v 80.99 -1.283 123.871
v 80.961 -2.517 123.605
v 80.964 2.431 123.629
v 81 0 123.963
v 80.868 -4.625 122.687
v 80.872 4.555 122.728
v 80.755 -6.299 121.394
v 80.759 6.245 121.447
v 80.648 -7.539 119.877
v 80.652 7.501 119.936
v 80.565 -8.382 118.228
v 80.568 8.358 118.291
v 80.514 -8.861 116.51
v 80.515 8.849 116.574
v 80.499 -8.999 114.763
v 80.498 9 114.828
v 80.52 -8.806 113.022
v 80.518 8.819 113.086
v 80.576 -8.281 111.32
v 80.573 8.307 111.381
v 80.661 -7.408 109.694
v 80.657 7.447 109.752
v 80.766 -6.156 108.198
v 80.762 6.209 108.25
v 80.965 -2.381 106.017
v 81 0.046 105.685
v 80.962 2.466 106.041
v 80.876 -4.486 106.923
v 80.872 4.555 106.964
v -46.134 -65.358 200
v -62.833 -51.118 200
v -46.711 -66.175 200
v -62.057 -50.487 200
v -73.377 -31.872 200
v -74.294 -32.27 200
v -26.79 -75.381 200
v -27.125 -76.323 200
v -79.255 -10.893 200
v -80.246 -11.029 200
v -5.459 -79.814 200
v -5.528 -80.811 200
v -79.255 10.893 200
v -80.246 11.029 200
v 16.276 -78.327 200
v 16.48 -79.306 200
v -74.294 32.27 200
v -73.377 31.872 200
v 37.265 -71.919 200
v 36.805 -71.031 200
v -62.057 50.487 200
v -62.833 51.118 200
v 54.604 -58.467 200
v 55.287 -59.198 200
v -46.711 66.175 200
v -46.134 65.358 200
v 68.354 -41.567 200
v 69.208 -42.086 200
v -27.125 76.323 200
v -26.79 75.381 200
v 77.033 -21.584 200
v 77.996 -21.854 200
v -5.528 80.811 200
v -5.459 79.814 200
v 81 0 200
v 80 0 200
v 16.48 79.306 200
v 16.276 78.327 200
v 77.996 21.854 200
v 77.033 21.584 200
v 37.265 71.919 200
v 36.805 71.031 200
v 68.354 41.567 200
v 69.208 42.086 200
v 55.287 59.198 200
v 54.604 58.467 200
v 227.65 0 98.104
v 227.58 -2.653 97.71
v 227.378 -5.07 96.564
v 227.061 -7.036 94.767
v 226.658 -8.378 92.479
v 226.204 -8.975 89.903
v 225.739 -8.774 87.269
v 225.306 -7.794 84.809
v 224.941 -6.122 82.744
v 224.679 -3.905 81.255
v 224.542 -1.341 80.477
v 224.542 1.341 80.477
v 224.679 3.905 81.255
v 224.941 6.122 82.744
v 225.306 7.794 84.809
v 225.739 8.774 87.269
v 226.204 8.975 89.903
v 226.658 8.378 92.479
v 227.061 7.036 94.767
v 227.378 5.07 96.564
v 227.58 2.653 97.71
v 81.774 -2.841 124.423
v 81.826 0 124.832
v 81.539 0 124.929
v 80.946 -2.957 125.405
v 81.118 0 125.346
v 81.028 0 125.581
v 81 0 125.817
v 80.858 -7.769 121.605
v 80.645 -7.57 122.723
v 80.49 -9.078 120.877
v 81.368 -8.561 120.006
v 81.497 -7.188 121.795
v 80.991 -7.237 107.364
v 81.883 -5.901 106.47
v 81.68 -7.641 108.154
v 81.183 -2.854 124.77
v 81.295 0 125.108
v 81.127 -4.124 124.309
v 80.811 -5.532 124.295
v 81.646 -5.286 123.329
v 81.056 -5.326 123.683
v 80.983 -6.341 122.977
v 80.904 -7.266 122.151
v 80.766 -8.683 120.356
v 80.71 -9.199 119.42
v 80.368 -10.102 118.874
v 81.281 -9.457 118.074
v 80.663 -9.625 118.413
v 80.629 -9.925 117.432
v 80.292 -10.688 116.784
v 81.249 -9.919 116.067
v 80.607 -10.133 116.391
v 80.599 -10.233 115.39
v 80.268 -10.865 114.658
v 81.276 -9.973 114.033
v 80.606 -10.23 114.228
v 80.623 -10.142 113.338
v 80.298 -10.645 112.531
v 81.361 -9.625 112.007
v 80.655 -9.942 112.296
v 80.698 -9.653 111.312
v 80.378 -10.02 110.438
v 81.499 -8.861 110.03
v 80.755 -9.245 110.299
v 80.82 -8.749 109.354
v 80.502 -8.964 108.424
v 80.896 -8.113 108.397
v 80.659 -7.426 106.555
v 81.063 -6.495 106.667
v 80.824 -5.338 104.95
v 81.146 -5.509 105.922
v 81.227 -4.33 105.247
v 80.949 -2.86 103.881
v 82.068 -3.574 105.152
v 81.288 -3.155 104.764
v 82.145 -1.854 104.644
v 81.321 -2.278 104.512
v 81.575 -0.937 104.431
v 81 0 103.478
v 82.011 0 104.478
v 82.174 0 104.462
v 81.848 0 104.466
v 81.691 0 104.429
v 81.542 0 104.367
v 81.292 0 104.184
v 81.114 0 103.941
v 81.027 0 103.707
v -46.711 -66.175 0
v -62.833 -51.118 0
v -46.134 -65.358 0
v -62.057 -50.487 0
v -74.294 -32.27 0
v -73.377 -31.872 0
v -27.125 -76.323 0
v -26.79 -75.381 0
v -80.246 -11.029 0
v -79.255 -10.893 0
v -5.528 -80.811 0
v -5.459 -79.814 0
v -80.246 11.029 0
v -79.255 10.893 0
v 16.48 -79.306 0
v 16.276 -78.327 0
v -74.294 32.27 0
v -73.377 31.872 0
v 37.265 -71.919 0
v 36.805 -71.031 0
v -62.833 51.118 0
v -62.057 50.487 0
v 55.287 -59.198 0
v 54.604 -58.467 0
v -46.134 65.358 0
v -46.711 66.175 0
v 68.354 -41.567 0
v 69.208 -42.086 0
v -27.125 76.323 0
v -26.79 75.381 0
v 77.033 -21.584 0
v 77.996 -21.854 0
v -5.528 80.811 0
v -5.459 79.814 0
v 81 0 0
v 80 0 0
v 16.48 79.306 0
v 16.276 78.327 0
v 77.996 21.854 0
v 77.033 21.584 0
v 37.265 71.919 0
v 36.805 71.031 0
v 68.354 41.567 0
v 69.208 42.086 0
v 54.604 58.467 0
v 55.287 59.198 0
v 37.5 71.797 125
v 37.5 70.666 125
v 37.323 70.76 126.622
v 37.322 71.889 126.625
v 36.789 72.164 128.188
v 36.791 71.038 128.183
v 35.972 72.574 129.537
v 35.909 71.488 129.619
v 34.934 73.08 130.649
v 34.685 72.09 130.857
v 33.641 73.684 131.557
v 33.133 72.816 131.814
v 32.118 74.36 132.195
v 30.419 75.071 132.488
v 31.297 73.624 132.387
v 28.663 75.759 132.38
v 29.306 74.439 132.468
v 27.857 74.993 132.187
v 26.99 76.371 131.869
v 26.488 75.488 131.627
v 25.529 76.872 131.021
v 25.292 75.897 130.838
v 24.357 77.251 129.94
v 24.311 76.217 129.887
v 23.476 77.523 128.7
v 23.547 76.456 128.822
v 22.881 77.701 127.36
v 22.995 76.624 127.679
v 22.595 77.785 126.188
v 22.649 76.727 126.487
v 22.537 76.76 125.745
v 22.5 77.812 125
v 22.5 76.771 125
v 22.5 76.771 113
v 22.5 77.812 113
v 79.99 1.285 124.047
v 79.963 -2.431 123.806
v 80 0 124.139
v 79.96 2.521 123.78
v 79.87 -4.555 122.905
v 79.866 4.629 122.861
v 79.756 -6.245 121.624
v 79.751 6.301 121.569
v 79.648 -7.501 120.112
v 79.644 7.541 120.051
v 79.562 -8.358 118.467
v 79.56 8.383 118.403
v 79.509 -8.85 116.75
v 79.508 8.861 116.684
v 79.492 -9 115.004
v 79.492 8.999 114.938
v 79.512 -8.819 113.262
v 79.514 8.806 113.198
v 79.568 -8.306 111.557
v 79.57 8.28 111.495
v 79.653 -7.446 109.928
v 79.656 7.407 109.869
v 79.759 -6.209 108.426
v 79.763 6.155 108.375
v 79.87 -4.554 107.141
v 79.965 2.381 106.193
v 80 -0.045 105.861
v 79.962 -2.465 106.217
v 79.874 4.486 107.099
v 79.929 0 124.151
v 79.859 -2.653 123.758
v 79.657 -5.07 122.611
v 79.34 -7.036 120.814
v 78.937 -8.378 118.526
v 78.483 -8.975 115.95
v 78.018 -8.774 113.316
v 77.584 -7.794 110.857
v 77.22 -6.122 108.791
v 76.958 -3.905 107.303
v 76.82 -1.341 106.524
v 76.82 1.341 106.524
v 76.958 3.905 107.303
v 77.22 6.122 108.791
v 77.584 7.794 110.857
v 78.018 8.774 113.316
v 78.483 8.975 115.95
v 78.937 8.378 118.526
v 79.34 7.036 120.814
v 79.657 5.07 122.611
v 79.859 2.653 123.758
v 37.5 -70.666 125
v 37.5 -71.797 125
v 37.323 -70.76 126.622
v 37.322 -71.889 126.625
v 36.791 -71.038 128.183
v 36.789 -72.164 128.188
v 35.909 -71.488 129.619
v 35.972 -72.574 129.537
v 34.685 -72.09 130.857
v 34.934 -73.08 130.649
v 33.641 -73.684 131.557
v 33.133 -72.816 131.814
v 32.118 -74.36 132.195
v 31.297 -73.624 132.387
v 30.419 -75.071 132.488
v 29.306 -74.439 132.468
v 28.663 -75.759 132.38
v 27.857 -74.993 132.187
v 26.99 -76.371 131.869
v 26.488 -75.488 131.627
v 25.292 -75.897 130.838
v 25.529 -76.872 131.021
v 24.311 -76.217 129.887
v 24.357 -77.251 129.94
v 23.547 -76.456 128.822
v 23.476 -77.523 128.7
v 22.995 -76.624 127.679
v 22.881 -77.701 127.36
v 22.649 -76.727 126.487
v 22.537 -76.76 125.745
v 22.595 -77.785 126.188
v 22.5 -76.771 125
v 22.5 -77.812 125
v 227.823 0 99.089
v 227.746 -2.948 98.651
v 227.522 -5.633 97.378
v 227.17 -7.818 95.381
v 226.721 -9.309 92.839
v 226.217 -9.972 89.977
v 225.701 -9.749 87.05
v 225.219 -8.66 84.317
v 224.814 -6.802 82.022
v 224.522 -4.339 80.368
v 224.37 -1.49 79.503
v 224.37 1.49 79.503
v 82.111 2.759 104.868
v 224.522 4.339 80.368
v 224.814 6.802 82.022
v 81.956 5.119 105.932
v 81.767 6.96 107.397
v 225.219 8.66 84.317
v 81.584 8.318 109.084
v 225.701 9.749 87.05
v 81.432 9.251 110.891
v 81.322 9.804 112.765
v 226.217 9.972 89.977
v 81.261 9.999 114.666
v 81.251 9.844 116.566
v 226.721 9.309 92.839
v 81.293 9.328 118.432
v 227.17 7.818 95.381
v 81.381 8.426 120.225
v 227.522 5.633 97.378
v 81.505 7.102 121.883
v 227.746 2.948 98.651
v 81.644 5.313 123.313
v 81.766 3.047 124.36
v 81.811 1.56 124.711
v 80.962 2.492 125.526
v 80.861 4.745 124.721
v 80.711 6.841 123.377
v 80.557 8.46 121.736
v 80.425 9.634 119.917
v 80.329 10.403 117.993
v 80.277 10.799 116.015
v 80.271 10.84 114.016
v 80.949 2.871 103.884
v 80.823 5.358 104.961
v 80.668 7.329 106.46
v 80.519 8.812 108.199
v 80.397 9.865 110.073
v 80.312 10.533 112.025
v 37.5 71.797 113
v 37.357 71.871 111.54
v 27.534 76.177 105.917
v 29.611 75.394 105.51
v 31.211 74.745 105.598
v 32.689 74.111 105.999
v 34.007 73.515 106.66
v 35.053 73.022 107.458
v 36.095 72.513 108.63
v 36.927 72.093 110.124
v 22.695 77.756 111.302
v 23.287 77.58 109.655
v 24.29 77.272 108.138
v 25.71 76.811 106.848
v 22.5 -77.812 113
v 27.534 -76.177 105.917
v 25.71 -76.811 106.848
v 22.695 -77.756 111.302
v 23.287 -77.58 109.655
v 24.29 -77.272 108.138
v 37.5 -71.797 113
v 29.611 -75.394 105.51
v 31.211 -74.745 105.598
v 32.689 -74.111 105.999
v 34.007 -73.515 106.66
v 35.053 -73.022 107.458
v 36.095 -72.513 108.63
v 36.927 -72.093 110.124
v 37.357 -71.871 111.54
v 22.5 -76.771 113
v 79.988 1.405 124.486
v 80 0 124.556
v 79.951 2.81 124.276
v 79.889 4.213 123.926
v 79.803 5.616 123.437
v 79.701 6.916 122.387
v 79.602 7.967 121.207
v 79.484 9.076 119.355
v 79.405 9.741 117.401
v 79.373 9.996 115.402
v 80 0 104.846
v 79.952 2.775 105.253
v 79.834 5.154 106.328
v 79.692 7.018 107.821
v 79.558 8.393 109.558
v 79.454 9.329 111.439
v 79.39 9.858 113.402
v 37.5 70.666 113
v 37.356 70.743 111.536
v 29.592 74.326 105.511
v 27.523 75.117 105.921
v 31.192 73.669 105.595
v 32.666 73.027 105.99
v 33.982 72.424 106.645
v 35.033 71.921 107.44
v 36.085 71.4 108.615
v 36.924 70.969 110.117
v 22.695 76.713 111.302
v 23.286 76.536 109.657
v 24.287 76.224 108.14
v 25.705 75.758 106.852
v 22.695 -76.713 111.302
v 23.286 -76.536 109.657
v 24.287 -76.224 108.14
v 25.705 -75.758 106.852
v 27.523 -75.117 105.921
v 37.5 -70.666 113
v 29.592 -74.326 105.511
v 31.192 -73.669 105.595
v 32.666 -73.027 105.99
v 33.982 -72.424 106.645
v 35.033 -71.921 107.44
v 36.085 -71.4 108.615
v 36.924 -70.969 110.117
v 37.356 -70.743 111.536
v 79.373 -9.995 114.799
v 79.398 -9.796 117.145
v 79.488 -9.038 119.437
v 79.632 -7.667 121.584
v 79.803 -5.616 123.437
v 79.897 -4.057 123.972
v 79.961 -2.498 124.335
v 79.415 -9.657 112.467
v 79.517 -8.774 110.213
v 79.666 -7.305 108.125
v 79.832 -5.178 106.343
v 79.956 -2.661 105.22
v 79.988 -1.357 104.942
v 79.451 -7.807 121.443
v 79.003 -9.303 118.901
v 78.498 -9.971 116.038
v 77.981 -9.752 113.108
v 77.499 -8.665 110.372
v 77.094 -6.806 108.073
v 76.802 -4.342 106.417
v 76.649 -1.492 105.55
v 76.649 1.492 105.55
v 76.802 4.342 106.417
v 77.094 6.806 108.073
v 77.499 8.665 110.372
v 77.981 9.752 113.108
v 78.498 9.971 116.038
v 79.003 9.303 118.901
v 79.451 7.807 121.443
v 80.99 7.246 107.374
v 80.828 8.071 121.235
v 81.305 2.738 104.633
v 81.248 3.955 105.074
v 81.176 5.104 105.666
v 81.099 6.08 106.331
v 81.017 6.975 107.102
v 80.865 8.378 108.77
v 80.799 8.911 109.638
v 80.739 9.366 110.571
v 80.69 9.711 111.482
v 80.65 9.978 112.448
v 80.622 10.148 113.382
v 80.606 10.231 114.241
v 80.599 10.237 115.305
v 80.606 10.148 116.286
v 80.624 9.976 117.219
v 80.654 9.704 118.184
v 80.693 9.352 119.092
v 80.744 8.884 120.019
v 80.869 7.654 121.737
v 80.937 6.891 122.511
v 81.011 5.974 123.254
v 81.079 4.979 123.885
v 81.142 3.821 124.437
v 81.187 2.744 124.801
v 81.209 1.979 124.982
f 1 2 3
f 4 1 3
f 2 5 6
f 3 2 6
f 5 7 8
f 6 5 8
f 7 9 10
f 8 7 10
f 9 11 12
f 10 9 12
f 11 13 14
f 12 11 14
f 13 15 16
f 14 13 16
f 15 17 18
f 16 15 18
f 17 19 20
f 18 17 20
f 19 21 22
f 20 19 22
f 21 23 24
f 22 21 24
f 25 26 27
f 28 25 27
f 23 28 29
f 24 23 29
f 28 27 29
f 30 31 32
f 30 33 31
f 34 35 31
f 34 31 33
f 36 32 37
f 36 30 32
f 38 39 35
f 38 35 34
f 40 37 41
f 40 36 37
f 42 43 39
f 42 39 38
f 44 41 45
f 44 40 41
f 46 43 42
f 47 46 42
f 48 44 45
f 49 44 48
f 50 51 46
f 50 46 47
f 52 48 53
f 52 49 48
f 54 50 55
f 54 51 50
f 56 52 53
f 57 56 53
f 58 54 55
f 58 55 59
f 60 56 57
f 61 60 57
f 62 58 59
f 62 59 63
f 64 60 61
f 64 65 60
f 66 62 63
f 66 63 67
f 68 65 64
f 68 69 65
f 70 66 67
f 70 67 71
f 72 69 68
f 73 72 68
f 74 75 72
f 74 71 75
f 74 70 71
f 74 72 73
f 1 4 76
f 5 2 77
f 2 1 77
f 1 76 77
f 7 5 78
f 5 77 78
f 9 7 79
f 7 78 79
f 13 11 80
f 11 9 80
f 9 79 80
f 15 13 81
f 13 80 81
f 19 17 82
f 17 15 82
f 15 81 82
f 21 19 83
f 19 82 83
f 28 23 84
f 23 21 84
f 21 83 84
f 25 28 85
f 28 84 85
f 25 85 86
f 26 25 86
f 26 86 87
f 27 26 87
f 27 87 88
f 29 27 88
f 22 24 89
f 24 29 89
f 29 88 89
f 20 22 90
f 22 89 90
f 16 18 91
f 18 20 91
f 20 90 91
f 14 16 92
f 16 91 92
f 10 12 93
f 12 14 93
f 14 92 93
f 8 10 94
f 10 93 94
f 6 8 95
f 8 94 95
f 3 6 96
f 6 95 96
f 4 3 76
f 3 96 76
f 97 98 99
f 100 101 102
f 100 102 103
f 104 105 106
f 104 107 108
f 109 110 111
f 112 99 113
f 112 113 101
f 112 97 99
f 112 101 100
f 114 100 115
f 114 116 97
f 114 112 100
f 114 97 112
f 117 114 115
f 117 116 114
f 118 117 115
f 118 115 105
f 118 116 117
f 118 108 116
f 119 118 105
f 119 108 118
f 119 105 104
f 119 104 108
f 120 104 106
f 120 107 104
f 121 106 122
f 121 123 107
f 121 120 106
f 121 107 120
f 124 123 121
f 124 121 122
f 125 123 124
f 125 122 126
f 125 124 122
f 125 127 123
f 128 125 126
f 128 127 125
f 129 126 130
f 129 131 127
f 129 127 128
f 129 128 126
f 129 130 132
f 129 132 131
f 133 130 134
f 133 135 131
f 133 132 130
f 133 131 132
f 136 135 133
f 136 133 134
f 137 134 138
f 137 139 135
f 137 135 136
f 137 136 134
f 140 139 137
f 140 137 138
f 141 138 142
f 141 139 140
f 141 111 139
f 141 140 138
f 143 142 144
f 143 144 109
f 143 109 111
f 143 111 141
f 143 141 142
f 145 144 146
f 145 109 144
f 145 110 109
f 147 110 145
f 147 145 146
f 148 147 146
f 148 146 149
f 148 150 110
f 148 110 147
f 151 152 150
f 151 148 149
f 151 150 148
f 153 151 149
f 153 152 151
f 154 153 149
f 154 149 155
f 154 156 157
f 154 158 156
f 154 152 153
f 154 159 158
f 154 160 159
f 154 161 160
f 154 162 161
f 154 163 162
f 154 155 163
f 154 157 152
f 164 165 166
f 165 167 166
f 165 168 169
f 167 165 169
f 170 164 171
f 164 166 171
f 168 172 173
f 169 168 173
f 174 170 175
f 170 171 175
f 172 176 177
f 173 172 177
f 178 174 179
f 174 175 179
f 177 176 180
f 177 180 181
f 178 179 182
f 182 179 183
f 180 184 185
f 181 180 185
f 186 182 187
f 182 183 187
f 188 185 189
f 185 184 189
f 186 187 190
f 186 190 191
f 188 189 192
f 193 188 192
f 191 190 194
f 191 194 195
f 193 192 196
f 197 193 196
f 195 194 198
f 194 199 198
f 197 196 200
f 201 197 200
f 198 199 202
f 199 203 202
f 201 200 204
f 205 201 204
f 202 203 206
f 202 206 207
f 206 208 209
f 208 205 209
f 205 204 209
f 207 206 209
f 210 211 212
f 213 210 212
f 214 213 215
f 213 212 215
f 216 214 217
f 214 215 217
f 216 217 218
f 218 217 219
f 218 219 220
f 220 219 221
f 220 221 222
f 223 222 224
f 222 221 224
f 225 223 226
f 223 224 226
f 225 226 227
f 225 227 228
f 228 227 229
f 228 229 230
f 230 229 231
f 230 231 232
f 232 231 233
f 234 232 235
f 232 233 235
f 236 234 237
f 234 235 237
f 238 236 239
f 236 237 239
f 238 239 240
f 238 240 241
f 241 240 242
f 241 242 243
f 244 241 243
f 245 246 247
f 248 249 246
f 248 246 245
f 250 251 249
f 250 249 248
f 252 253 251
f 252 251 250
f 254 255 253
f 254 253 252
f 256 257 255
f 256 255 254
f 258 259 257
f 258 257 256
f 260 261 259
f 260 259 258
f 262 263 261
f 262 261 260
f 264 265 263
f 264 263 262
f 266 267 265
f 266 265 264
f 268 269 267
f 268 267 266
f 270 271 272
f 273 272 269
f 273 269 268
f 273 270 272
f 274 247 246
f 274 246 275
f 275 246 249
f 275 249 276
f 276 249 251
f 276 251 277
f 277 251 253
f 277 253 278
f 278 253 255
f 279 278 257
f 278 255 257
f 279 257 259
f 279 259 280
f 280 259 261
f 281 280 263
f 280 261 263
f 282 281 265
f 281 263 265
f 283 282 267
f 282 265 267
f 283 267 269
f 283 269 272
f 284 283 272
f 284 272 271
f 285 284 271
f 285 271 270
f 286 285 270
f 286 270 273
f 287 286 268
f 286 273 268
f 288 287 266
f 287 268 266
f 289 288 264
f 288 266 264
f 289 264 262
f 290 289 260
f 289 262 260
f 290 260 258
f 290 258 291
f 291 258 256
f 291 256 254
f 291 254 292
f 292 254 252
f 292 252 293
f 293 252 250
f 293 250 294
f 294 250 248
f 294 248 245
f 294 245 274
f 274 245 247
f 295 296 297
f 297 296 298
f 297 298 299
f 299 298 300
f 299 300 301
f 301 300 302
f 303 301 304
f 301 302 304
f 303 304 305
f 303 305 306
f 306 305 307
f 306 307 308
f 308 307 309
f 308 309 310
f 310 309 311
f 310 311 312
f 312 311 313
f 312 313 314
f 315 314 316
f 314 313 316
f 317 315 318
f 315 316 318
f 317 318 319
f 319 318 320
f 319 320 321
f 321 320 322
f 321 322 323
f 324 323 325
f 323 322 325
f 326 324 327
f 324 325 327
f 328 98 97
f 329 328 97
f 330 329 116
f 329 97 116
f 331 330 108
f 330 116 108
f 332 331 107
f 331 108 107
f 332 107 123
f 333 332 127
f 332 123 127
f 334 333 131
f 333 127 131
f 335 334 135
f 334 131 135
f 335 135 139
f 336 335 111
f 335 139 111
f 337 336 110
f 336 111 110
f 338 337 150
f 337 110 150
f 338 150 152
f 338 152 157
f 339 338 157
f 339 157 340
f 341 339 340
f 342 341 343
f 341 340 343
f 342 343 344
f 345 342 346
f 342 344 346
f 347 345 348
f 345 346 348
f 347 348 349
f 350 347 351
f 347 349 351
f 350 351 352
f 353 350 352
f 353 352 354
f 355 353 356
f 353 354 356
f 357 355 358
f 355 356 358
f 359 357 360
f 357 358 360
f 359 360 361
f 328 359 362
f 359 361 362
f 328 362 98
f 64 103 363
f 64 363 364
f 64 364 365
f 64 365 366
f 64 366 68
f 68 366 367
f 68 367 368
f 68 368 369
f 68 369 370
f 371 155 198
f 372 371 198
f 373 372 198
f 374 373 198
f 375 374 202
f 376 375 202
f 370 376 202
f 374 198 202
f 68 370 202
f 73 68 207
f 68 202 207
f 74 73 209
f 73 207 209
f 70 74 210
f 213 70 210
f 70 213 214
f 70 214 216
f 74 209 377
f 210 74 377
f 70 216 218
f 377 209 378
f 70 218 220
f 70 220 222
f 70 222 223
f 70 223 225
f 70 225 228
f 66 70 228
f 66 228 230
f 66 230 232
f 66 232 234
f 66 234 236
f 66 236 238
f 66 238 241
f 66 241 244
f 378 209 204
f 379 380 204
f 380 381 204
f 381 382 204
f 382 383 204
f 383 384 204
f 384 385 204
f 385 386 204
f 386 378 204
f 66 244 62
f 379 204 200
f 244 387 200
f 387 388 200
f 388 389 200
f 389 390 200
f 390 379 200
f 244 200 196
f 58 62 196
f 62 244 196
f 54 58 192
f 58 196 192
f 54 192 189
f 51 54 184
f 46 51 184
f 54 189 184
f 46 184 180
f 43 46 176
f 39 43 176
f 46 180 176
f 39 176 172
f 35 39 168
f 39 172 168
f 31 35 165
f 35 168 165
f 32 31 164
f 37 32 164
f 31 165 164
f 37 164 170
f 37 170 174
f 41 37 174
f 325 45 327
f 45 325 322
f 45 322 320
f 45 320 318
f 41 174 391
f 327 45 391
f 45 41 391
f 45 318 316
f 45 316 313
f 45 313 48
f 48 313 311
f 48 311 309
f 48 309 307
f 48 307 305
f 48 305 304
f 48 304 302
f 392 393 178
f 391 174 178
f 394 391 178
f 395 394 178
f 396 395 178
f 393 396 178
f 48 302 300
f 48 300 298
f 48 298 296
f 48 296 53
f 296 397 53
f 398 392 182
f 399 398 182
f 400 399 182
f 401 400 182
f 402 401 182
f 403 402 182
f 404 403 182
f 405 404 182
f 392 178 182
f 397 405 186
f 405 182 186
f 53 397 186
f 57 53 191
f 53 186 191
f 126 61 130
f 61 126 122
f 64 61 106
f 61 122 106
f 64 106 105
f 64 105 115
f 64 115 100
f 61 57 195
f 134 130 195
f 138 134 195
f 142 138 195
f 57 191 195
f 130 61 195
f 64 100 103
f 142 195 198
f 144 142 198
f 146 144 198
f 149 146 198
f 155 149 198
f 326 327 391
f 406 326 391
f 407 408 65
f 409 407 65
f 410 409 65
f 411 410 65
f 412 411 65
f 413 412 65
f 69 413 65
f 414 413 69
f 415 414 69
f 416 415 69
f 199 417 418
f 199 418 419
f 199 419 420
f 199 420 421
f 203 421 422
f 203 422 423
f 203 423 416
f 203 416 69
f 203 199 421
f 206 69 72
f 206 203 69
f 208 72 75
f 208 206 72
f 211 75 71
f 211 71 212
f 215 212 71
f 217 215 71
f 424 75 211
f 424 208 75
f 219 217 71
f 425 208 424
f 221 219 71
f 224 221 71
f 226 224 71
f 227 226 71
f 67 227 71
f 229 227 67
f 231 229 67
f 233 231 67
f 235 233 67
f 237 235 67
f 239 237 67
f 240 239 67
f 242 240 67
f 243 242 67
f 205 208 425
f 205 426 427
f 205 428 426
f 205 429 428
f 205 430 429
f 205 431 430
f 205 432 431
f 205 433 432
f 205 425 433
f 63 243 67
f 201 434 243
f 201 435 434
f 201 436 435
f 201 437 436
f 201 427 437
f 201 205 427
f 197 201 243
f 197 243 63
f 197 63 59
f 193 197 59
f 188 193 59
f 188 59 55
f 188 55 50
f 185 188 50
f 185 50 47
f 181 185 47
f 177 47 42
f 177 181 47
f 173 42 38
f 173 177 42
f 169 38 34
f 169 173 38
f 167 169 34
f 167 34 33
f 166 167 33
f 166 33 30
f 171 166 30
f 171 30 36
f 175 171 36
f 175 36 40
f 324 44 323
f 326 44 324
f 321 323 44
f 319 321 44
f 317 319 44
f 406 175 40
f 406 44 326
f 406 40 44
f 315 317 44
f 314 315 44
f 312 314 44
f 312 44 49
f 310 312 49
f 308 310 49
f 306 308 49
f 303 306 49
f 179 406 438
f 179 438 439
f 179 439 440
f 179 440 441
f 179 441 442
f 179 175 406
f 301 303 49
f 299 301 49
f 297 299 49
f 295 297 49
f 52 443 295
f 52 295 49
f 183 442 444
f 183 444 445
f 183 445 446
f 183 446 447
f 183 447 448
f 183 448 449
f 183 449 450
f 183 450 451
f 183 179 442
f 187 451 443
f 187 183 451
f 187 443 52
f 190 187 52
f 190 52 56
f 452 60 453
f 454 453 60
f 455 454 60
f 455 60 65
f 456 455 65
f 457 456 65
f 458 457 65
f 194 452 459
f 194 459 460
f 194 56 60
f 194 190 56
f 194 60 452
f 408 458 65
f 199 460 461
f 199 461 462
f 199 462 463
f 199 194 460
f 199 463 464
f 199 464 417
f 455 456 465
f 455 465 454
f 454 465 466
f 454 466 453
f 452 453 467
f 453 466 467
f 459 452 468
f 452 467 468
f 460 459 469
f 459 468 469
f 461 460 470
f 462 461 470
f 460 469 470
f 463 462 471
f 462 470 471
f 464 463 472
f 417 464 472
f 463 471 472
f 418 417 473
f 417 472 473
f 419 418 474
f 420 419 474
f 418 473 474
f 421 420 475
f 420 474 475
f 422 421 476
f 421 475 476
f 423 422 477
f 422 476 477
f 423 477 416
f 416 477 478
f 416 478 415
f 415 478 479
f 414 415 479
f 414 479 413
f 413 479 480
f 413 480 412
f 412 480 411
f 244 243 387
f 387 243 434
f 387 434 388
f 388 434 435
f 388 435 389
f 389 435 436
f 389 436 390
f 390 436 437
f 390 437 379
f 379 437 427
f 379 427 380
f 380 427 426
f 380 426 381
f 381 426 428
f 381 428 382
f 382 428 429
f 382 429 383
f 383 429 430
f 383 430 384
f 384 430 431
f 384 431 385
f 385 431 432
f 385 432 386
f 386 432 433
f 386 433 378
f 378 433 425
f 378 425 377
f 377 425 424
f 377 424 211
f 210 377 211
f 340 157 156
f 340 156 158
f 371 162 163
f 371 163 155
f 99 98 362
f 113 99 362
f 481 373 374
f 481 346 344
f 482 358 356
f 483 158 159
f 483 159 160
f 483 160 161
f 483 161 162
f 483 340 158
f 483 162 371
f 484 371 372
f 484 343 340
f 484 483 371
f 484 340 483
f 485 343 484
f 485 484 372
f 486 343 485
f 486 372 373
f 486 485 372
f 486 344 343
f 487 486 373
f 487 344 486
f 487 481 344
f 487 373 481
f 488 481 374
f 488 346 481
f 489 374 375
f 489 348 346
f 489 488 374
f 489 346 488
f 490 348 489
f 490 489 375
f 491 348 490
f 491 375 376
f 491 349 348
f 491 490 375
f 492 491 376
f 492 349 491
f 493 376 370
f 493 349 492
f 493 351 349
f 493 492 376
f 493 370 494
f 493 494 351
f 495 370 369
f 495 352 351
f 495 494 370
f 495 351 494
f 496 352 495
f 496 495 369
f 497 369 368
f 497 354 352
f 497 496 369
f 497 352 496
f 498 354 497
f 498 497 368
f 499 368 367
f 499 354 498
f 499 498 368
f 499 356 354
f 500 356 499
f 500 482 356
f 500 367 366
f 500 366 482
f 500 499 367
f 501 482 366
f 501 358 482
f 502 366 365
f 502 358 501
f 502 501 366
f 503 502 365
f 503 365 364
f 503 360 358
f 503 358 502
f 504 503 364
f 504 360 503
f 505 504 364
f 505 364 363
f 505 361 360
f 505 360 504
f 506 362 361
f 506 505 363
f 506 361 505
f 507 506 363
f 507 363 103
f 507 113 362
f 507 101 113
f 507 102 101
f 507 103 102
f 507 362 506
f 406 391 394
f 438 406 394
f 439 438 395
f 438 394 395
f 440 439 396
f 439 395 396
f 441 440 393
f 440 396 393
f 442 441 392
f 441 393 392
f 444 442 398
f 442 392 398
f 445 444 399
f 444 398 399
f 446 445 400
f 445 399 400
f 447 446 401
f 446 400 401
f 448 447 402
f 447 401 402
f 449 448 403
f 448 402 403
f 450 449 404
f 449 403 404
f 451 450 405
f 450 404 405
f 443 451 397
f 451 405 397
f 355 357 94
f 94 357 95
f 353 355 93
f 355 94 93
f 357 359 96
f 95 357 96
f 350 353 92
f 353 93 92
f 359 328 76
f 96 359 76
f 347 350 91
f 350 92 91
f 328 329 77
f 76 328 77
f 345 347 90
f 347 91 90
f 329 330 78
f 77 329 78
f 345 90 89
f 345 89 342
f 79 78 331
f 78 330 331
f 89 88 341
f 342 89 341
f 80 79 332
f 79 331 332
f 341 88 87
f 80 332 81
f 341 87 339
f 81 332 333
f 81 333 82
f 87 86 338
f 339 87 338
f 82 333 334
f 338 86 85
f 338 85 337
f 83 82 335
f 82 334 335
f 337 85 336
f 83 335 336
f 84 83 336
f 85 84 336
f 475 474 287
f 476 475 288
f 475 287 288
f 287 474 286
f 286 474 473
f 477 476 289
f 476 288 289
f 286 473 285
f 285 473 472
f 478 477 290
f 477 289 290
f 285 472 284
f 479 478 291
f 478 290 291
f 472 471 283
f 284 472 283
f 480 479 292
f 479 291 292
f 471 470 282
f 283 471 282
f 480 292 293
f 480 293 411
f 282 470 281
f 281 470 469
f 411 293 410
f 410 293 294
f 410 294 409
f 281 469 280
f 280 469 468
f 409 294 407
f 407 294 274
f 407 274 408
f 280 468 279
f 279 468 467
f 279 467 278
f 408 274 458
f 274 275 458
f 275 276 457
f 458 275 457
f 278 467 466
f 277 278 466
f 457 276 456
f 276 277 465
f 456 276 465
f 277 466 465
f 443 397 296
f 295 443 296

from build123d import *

# Parameters (mm, degrees)
F0_R     = 81
F0_R_2   = 80
F1_DEPTH = 200
F3_DEPTH = 150
F6_R     = 1


with BuildPart() as f1:
    # F0 (on Top) → F1 (new body)
    with BuildSketch(Plane.XY):
        Circle(F0_R)
        Circle(F0_R_2, mode=Mode.SUBTRACT)
    extrude(amount=F1_DEPTH)

    # F2 (on Front) → F3 (cut, symmetric)
    with BuildSketch(Plane.XZ):
        with BuildLine():
            Line((37.5, 113), (37.5, 125))
            ThreePointArc((37.5, 125), (30, 132.5), (22.5, 125))
            Line((22.5, 125), (22.5, 113))
            ThreePointArc((22.5, 113), (30, 105.5), (37.5, 113))
        make_face()
    extrude(amount=F3_DEPTH, both=True, mode=Mode.SUBTRACT)

    # F4 (on Front) → F5 (revolve)
    with BuildSketch(Plane.XZ):
        Polygon((227.8234839022, 99.0889975246), (80.1023209503, 125.1362241746), (79.9286727727, 124.1514164216), (227.6498357245, 98.1041897716), align=None)
    revolve(axis=Axis((158.0200701243, 0, 101.2429566003), (0.984807753, 0, -0.1736481777)))

    # F6
    f6_edges = [f1.edges().sort_by_distance(p)[0] for p in [
        (80.380378, -9.99974, 114.85969),
        (80.380378, 9.99974, 114.85969),
    ]]
    fillet(f6_edges, radius=F6_R)


solid = f1.part
